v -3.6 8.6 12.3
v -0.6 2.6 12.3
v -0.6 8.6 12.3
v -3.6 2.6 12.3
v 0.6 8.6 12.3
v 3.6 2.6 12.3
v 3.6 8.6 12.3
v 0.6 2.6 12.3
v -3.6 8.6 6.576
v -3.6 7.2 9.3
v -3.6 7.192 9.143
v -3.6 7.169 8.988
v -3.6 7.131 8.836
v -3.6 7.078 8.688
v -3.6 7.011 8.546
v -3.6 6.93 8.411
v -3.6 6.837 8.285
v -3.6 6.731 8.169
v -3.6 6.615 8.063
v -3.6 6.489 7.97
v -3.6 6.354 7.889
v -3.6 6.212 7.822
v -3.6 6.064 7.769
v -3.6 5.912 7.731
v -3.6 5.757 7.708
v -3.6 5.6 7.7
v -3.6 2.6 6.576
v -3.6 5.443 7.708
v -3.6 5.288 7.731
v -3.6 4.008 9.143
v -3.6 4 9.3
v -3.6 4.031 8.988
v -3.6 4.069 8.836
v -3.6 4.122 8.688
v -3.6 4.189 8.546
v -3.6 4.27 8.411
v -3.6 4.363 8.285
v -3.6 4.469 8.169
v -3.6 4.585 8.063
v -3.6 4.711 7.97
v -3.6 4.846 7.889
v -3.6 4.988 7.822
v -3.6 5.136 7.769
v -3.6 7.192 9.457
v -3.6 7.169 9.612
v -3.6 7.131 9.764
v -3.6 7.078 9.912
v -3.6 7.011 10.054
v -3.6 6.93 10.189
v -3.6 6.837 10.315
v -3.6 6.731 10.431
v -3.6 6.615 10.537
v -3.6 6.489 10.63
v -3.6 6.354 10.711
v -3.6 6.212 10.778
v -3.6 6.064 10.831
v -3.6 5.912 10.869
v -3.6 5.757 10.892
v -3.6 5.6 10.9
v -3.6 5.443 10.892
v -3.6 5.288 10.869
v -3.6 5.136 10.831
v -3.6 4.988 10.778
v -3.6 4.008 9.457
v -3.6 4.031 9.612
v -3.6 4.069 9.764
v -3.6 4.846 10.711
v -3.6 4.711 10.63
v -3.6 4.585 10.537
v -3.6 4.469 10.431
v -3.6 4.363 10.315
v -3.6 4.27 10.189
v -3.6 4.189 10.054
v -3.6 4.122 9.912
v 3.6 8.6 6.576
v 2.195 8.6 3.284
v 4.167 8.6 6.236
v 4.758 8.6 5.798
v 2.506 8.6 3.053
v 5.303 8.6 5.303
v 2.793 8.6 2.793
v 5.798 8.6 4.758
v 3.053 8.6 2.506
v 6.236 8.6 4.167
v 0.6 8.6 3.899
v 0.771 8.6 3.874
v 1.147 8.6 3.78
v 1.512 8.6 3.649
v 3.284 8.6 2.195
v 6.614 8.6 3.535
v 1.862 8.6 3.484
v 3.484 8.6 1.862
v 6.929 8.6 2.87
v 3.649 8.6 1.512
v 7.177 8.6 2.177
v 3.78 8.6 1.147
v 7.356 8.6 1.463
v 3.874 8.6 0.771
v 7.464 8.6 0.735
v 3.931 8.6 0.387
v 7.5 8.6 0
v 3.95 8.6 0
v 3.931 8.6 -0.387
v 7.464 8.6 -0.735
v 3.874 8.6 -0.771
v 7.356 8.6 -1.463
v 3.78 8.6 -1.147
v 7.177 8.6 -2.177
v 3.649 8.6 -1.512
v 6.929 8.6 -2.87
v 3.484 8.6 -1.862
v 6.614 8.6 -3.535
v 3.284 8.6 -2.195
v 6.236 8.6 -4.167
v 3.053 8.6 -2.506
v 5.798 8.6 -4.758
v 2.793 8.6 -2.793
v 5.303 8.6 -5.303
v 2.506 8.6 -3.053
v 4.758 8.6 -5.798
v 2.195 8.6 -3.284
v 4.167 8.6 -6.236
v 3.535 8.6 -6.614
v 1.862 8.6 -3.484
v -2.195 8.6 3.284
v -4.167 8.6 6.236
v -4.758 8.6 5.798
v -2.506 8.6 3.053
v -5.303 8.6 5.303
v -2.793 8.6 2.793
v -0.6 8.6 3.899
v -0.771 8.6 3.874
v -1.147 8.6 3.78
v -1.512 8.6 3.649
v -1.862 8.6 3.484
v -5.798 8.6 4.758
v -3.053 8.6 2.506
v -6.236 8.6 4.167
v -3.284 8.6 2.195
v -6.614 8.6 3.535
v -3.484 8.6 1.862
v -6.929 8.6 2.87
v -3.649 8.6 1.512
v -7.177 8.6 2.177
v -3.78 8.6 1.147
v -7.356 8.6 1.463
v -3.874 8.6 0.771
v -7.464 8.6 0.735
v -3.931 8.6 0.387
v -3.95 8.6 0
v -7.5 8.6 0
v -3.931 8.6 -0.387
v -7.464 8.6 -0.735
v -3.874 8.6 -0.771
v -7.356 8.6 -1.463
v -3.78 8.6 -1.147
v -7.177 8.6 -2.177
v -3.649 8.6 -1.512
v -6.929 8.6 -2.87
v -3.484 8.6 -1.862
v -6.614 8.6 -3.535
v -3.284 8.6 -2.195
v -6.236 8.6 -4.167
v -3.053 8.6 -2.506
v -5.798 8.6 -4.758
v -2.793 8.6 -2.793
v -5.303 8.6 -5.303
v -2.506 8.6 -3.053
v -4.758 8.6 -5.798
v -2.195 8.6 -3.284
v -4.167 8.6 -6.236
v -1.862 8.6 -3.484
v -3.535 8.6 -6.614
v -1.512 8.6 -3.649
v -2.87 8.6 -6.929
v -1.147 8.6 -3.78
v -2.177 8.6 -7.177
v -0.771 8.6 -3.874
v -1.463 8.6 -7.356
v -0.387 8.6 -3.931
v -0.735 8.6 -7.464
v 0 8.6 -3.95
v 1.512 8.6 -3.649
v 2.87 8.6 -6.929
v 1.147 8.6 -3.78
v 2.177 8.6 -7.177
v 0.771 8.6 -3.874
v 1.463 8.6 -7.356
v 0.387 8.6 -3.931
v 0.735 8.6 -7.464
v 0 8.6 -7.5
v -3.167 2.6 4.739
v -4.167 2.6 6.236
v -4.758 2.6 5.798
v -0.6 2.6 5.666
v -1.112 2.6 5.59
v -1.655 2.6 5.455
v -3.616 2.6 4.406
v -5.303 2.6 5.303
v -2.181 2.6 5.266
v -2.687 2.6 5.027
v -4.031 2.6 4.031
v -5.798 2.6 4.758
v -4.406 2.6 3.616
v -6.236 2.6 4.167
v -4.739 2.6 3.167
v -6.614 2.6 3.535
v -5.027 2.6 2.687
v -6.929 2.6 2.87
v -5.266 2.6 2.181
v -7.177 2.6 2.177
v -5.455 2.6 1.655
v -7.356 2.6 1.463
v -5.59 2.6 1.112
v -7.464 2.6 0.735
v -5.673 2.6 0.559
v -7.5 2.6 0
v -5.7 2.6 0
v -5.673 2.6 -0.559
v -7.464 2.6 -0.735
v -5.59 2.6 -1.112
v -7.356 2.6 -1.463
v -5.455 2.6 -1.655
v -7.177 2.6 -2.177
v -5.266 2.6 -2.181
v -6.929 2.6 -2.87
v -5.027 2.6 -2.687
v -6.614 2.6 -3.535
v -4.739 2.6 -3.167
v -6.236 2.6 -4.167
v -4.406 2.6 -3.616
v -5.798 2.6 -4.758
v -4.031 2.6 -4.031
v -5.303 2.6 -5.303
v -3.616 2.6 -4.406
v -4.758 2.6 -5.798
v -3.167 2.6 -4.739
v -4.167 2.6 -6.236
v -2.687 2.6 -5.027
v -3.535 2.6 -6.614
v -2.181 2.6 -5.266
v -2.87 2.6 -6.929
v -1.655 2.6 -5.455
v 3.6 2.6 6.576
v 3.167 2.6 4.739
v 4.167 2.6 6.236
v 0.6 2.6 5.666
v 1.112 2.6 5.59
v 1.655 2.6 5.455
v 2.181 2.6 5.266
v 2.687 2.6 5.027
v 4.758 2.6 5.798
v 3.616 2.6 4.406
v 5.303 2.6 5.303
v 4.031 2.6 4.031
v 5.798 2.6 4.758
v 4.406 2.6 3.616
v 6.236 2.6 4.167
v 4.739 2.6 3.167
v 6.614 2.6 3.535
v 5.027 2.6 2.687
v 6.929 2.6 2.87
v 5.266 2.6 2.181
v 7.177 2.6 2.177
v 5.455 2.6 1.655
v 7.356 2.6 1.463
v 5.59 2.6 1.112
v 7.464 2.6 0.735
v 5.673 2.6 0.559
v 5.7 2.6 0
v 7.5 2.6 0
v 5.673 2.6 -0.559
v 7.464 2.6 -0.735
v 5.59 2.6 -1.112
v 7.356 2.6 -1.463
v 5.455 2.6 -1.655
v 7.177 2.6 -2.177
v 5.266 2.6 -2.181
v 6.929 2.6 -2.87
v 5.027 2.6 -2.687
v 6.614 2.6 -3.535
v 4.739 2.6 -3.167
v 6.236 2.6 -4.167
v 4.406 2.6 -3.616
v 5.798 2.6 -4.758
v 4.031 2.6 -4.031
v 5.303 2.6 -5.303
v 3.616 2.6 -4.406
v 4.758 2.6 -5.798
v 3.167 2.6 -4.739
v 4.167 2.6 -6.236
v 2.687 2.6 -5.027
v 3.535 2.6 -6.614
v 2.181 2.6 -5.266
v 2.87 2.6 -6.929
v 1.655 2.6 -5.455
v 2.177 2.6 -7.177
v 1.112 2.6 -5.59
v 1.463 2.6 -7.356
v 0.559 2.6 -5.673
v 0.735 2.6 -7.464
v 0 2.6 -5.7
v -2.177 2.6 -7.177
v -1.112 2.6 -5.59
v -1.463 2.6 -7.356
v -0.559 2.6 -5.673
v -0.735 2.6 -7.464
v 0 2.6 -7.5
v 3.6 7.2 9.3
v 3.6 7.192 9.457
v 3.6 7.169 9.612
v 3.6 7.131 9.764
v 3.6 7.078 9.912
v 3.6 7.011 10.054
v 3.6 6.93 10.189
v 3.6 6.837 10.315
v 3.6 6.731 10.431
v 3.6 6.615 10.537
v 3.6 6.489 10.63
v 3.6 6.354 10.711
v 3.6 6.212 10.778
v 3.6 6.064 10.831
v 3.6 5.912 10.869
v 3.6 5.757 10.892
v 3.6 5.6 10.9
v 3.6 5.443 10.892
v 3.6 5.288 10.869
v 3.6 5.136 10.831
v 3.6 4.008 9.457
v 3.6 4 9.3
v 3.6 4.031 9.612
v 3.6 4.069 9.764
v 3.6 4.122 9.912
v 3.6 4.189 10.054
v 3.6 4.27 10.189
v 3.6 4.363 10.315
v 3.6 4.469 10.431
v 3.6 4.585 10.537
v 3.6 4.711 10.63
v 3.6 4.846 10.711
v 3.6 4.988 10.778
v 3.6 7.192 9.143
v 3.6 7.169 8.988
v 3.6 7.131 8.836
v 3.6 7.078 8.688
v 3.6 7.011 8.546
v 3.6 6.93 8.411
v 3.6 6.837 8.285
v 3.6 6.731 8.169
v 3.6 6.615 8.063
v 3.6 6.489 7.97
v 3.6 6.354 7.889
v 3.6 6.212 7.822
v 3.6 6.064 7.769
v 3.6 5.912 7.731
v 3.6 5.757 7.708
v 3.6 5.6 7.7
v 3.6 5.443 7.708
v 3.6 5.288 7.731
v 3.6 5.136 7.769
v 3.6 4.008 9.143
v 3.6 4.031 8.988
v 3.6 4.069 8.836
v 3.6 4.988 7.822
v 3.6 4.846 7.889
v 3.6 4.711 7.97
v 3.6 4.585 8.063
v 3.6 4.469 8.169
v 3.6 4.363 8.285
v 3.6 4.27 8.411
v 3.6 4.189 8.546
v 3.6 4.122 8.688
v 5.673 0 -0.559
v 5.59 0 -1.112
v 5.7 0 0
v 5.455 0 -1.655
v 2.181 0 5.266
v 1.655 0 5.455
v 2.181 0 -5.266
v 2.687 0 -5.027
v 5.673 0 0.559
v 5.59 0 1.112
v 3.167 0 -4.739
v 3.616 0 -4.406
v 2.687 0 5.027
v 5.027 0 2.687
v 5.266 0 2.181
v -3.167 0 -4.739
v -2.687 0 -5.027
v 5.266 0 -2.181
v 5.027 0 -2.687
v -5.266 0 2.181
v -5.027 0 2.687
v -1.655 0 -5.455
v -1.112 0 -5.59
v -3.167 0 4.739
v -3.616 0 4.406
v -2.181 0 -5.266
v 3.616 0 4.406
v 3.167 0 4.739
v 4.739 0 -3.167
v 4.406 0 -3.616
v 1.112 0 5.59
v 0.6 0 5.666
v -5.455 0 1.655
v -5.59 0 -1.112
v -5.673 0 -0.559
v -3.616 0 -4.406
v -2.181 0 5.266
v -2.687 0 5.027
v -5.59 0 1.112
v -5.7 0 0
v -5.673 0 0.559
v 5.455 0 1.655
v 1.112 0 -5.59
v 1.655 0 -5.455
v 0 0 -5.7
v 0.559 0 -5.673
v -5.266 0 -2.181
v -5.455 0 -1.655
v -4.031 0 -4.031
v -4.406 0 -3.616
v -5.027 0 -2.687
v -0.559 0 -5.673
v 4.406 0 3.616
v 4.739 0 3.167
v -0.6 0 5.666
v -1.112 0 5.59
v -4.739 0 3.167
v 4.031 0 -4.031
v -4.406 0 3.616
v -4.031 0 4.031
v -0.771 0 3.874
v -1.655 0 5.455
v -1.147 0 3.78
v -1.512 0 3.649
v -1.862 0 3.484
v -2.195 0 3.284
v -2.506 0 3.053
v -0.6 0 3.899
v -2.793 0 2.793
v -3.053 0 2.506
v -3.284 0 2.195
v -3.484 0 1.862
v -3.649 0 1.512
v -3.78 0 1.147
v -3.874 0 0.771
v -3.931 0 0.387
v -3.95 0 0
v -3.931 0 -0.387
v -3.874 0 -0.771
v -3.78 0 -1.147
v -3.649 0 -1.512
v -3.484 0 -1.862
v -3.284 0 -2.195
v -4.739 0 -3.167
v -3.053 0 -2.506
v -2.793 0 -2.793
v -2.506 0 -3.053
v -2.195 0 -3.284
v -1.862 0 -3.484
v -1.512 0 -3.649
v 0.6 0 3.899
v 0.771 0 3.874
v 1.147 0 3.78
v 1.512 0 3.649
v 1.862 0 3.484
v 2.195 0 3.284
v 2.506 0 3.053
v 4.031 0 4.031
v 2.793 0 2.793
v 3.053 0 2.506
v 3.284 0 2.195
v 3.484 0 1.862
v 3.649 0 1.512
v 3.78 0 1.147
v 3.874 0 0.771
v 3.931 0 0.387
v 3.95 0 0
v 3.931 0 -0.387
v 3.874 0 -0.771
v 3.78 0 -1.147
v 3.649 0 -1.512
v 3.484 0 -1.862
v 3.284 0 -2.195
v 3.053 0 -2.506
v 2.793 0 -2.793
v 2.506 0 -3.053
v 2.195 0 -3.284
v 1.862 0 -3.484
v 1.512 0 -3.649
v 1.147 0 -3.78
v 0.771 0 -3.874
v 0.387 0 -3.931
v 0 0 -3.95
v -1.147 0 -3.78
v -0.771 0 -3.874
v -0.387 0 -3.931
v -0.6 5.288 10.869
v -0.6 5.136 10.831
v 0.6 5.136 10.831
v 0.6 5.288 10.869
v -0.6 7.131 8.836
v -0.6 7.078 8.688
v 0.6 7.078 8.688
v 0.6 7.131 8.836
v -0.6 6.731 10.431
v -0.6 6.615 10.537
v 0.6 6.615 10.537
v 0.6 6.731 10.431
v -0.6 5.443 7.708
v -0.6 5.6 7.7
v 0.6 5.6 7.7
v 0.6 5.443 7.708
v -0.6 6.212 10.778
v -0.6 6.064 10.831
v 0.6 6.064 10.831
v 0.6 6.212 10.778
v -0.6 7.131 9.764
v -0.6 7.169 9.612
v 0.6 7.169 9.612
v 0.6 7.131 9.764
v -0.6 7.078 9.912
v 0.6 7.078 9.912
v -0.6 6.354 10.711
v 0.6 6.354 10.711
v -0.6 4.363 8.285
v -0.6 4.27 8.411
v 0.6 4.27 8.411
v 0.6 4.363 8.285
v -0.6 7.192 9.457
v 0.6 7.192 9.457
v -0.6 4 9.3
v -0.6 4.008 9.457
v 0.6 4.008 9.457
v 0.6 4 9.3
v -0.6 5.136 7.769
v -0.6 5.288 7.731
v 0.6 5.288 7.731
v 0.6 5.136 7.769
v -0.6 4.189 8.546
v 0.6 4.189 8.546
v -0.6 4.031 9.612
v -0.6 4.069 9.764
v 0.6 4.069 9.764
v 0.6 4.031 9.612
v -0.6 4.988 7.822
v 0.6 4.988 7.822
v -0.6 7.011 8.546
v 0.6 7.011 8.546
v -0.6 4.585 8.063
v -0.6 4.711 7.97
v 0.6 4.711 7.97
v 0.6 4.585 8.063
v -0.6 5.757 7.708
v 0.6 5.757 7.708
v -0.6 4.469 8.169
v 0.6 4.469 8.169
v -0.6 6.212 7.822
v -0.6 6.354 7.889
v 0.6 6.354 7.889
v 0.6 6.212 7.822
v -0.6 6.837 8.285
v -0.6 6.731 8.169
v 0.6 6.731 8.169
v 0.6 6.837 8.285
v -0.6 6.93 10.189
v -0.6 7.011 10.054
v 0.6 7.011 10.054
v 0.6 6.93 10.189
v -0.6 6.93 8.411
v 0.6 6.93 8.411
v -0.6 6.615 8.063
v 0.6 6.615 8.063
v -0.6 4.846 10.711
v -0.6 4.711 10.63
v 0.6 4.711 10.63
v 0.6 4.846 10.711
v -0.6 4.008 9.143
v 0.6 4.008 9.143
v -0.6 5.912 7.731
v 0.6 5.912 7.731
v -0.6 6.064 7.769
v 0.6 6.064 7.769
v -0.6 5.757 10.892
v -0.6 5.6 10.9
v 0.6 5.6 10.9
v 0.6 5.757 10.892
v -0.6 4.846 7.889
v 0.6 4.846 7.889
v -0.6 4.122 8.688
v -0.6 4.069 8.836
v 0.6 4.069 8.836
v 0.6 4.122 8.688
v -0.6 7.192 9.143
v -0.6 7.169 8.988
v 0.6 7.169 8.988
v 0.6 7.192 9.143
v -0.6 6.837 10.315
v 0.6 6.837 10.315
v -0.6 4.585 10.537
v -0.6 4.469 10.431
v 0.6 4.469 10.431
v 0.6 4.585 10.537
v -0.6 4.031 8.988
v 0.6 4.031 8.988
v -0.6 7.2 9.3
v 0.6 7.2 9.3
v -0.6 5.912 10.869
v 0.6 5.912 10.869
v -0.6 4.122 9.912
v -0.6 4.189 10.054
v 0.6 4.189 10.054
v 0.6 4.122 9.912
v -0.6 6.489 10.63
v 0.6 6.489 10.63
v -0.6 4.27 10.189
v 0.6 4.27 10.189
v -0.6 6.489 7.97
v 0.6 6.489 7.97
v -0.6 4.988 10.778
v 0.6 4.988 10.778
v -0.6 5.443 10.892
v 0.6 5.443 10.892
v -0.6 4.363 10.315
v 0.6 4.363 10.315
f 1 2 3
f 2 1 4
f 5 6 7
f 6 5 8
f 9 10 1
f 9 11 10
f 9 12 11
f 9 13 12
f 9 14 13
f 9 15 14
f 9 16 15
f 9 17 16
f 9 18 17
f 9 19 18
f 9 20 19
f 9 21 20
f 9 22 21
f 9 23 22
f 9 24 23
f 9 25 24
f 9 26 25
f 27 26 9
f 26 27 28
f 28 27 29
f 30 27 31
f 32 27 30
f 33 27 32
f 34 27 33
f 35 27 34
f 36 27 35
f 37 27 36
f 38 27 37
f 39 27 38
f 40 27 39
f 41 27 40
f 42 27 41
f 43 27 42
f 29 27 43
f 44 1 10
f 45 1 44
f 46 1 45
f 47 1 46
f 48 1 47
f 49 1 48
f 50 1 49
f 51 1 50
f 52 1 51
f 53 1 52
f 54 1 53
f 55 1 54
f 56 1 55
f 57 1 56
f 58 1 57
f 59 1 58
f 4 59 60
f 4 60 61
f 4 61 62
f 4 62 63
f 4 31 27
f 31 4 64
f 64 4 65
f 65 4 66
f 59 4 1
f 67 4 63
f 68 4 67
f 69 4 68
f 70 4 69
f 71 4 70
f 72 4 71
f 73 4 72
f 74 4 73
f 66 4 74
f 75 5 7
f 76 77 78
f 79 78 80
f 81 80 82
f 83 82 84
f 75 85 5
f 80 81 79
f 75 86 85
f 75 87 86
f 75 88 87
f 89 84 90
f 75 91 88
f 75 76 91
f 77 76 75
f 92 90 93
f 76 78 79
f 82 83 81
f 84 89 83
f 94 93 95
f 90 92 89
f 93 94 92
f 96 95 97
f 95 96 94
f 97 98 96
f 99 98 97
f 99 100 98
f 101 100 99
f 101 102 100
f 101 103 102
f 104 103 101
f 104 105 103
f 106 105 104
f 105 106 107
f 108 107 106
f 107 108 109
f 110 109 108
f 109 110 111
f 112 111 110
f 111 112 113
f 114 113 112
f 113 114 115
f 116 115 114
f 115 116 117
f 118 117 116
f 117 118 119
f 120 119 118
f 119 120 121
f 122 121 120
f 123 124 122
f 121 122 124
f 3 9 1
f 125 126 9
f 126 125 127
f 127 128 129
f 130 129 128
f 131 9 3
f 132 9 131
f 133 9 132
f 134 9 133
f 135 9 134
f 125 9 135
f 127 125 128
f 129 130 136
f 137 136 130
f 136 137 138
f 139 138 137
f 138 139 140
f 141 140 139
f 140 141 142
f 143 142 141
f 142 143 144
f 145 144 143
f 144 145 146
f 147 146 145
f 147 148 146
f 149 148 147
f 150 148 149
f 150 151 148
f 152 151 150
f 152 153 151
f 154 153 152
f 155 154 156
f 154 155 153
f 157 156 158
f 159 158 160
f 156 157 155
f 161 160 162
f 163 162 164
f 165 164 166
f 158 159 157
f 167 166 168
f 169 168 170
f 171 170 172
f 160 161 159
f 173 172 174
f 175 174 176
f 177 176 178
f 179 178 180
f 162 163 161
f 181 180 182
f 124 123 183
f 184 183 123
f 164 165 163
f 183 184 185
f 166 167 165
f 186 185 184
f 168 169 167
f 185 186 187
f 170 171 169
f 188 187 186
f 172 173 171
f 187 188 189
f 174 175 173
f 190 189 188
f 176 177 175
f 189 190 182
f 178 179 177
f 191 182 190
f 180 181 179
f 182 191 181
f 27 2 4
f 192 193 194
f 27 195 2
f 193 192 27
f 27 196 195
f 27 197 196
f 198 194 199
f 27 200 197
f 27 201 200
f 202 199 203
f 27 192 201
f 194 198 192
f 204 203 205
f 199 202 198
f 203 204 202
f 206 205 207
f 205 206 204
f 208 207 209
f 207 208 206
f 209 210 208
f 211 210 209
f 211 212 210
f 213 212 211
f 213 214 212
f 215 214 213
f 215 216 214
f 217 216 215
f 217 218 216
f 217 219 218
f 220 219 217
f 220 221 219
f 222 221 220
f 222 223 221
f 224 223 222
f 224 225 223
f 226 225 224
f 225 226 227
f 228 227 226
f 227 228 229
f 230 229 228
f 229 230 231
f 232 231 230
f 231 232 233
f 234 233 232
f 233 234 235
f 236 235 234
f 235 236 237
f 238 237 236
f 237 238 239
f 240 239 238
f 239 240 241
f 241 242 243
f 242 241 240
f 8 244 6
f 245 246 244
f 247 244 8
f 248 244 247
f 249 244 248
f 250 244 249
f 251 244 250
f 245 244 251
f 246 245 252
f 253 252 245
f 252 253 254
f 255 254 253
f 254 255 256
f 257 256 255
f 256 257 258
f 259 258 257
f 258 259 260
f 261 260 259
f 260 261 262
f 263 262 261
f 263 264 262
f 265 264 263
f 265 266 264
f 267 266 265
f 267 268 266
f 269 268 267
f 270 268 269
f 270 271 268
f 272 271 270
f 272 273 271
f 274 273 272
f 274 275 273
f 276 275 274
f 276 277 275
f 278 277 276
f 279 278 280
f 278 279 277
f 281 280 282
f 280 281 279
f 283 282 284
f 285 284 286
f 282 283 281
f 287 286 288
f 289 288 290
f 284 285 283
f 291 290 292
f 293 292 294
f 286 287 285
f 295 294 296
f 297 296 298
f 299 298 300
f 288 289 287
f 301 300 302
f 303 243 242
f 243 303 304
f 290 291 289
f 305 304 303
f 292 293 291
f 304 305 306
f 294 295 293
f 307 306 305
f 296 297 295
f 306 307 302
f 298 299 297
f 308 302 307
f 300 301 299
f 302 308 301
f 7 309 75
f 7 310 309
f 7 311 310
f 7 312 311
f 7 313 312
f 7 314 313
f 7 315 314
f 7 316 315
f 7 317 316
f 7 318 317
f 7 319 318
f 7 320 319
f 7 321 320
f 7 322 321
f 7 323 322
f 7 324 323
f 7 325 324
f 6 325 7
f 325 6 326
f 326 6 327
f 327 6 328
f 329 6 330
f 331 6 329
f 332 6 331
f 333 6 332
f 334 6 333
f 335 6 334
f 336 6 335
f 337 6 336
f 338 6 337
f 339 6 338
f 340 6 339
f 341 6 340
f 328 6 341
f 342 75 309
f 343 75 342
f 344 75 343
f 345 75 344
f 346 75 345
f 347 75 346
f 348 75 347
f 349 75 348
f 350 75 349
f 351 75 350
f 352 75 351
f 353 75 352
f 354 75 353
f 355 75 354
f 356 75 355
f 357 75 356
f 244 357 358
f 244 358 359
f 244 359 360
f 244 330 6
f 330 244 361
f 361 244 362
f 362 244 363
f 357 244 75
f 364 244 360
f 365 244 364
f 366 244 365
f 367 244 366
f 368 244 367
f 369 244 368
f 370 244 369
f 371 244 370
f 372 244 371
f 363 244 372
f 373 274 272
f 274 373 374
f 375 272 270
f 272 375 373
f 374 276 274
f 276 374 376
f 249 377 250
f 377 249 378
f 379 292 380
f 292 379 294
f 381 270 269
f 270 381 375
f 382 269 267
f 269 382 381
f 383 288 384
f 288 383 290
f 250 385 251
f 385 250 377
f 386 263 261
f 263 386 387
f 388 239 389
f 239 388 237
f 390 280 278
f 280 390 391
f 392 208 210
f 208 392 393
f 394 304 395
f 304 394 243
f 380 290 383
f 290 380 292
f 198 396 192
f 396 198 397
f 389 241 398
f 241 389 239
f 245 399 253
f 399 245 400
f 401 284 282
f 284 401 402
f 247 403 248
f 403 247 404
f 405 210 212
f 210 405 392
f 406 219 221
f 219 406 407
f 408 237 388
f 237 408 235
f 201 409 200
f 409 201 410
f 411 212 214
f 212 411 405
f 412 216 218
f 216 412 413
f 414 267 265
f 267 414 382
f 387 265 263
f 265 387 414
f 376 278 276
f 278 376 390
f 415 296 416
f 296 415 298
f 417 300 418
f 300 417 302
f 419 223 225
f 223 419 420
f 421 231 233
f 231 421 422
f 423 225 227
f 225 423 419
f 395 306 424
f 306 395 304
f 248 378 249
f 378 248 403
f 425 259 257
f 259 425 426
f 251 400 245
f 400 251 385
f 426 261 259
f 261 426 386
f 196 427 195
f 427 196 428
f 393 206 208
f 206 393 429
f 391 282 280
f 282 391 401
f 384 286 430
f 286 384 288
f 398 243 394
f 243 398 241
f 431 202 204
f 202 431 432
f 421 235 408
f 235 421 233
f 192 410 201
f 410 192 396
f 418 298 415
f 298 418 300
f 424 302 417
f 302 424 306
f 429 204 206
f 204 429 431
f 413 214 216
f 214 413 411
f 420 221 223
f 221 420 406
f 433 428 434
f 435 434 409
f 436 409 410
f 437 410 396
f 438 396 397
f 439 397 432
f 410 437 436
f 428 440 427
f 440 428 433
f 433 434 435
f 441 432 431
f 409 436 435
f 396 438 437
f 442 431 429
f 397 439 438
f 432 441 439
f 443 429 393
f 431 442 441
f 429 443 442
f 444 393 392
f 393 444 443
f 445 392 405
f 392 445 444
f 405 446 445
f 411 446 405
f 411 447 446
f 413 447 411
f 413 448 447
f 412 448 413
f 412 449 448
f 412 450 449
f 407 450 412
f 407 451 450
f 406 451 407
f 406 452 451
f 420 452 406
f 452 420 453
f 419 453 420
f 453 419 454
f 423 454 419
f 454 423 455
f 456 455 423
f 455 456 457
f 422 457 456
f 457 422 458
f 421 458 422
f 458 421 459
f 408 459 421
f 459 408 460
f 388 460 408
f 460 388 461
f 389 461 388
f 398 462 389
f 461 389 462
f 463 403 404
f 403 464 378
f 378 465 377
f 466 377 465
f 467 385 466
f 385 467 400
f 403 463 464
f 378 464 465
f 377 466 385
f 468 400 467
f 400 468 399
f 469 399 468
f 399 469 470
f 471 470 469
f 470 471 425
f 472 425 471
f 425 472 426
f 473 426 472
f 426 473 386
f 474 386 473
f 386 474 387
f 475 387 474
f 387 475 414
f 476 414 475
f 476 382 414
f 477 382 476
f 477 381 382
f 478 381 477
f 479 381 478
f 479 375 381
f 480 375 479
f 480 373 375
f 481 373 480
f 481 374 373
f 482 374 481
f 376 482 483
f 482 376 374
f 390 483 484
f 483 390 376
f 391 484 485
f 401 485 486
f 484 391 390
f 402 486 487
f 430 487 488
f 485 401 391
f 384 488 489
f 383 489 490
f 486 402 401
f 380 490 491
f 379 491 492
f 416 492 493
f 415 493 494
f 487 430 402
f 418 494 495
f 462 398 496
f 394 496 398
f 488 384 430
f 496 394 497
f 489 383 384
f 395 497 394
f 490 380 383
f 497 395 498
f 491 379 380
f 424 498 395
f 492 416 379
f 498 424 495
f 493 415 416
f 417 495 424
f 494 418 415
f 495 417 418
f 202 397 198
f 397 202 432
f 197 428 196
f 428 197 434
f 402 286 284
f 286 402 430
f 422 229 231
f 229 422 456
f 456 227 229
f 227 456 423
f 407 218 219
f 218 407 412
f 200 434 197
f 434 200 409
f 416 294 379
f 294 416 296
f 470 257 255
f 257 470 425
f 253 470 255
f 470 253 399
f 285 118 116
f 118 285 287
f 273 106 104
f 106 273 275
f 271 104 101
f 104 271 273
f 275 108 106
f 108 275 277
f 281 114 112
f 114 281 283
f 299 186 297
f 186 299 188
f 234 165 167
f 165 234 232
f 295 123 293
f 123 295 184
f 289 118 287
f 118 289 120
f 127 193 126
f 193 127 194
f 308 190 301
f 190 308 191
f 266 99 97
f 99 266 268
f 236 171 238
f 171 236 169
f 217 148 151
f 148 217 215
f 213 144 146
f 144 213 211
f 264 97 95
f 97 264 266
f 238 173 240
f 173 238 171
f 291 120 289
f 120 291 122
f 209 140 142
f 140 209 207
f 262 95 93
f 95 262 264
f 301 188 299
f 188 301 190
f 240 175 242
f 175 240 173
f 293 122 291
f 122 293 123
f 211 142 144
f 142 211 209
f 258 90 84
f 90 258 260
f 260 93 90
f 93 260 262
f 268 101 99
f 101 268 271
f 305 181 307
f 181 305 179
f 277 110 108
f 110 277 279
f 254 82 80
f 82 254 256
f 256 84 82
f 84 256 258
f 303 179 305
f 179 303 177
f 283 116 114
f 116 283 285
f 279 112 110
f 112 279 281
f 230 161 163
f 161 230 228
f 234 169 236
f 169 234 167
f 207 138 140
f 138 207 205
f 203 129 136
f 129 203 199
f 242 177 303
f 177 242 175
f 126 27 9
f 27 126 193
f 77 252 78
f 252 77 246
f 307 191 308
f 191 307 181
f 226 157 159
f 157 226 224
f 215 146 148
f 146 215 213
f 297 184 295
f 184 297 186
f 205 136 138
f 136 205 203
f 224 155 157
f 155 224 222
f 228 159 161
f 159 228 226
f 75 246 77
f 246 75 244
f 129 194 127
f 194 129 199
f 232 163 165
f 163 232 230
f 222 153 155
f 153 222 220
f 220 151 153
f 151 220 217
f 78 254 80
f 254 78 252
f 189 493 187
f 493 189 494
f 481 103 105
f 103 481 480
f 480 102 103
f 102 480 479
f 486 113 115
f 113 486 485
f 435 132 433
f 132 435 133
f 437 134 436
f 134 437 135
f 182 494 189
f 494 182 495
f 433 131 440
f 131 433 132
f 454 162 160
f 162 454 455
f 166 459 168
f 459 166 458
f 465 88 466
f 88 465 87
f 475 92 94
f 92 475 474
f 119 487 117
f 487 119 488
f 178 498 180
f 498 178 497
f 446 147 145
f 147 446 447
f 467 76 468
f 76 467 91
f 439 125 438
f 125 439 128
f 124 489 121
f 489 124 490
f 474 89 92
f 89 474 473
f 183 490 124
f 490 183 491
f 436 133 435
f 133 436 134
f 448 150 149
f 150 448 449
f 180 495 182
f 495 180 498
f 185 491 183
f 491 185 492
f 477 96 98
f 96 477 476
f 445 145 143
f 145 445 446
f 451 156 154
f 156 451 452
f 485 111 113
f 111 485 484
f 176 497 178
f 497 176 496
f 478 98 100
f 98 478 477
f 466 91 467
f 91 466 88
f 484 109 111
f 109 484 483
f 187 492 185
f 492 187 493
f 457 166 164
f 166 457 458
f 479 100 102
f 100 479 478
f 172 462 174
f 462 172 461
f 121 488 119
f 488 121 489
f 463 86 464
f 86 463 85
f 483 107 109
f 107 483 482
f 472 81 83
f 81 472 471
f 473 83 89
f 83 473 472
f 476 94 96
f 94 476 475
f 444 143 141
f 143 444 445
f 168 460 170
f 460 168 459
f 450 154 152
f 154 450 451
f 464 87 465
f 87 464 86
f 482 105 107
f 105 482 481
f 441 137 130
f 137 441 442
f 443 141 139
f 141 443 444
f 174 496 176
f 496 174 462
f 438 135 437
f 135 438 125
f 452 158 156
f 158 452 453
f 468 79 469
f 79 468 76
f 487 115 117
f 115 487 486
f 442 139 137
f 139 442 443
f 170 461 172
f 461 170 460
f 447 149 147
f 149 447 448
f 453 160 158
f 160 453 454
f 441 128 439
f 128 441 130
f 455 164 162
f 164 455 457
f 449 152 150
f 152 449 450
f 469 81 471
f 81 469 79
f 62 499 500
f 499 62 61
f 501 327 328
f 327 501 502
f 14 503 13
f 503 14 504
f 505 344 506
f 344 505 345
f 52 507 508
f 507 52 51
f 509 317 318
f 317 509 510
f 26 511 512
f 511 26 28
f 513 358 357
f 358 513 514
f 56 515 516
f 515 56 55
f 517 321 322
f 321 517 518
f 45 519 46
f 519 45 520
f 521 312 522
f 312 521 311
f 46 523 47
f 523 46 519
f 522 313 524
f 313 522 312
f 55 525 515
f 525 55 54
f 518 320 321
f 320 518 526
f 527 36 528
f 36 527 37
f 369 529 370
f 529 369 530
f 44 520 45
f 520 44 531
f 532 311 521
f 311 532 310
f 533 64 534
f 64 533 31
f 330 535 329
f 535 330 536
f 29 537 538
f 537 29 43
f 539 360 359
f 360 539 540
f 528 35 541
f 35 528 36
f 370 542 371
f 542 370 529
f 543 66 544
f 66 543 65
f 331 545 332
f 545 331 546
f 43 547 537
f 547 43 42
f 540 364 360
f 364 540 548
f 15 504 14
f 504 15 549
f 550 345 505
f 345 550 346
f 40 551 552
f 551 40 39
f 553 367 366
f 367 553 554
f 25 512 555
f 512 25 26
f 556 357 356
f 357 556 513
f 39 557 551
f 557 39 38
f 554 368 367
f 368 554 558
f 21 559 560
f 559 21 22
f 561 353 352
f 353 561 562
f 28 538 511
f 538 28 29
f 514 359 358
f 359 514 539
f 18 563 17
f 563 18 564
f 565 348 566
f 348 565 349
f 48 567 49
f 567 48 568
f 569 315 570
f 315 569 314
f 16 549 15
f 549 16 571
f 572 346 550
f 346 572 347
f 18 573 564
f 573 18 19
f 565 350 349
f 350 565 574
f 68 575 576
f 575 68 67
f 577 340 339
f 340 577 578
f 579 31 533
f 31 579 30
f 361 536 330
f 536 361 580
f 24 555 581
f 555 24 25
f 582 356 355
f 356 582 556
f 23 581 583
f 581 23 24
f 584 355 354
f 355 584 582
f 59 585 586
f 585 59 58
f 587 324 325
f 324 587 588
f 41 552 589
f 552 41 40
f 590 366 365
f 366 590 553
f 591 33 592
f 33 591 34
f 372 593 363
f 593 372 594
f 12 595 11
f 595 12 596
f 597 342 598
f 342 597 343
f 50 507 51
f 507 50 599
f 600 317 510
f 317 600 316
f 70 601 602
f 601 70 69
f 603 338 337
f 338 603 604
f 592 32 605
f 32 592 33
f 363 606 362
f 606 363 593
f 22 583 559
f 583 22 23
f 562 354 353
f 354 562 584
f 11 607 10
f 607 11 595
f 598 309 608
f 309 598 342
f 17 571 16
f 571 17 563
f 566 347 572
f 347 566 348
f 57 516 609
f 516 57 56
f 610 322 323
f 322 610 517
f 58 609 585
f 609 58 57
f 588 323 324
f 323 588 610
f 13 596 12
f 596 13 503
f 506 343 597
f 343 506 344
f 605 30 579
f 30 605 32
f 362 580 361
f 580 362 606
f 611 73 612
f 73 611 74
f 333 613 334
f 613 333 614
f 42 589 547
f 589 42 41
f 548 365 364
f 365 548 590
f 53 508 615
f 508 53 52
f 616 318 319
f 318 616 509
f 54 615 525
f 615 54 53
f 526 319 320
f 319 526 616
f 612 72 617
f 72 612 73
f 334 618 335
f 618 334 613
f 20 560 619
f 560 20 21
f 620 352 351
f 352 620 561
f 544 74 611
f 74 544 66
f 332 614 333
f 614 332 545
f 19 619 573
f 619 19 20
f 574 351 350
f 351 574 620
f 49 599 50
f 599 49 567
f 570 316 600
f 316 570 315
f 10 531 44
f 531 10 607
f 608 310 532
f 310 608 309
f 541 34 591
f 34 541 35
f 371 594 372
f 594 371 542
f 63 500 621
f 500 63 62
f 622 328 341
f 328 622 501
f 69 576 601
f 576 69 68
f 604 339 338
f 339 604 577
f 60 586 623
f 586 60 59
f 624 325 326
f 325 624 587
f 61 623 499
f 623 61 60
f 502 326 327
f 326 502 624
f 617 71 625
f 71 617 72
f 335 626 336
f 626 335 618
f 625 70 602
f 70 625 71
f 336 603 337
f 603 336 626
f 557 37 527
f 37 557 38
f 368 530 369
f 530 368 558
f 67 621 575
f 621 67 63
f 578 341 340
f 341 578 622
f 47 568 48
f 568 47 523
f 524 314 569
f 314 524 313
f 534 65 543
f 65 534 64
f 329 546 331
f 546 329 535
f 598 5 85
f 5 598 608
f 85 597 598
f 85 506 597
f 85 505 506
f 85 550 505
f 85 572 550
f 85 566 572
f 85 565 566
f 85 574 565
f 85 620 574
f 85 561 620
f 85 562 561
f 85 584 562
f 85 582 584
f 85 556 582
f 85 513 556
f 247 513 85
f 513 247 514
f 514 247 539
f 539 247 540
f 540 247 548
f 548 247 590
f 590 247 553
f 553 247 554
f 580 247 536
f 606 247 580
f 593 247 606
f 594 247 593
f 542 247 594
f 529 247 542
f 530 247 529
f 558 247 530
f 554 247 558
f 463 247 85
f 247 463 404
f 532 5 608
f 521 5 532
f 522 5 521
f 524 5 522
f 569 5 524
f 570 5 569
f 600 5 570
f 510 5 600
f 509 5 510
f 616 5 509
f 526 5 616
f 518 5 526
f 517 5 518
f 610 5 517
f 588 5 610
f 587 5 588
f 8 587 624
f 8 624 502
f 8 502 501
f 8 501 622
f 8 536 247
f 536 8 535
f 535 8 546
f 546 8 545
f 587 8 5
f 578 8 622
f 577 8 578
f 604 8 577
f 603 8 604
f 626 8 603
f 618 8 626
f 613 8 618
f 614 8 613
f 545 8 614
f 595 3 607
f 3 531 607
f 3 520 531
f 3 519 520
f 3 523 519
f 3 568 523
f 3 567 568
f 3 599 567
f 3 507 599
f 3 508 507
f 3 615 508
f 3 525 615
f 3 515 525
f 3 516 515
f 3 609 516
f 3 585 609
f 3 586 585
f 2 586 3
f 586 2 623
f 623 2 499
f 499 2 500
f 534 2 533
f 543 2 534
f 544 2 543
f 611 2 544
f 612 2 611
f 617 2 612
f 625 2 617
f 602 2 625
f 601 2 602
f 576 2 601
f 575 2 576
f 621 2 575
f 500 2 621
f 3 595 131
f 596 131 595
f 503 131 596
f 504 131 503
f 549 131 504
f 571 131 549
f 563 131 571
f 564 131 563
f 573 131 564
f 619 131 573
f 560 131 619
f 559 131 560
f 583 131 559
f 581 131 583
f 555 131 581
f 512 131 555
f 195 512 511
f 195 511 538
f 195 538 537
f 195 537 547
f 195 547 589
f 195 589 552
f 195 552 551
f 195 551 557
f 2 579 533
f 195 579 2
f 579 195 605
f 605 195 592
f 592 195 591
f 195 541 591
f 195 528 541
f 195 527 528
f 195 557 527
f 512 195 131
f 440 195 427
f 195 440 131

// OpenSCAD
// Standalone v5.2 ankle INNER lock collar - PRINT 2 (one per side).
// Extended-nose collar that clamps the printed socket axle just inboard
// of the 608 inner ring: hub stop | inner ring | this collar = positive
// axial retention both ways (glue optional).
// Clamp bolt: M3 through the split lugs, reachable from the open center
// of the v5.2 carrier. Nose length bridges the housing land so the collar
// body clears the housing inner wall.
// Edit shared dimensions in frame_v5.scad so everything stays linked.

part_mode = "ankle_collar";
print_export = true;

include <frame_master.scad>
